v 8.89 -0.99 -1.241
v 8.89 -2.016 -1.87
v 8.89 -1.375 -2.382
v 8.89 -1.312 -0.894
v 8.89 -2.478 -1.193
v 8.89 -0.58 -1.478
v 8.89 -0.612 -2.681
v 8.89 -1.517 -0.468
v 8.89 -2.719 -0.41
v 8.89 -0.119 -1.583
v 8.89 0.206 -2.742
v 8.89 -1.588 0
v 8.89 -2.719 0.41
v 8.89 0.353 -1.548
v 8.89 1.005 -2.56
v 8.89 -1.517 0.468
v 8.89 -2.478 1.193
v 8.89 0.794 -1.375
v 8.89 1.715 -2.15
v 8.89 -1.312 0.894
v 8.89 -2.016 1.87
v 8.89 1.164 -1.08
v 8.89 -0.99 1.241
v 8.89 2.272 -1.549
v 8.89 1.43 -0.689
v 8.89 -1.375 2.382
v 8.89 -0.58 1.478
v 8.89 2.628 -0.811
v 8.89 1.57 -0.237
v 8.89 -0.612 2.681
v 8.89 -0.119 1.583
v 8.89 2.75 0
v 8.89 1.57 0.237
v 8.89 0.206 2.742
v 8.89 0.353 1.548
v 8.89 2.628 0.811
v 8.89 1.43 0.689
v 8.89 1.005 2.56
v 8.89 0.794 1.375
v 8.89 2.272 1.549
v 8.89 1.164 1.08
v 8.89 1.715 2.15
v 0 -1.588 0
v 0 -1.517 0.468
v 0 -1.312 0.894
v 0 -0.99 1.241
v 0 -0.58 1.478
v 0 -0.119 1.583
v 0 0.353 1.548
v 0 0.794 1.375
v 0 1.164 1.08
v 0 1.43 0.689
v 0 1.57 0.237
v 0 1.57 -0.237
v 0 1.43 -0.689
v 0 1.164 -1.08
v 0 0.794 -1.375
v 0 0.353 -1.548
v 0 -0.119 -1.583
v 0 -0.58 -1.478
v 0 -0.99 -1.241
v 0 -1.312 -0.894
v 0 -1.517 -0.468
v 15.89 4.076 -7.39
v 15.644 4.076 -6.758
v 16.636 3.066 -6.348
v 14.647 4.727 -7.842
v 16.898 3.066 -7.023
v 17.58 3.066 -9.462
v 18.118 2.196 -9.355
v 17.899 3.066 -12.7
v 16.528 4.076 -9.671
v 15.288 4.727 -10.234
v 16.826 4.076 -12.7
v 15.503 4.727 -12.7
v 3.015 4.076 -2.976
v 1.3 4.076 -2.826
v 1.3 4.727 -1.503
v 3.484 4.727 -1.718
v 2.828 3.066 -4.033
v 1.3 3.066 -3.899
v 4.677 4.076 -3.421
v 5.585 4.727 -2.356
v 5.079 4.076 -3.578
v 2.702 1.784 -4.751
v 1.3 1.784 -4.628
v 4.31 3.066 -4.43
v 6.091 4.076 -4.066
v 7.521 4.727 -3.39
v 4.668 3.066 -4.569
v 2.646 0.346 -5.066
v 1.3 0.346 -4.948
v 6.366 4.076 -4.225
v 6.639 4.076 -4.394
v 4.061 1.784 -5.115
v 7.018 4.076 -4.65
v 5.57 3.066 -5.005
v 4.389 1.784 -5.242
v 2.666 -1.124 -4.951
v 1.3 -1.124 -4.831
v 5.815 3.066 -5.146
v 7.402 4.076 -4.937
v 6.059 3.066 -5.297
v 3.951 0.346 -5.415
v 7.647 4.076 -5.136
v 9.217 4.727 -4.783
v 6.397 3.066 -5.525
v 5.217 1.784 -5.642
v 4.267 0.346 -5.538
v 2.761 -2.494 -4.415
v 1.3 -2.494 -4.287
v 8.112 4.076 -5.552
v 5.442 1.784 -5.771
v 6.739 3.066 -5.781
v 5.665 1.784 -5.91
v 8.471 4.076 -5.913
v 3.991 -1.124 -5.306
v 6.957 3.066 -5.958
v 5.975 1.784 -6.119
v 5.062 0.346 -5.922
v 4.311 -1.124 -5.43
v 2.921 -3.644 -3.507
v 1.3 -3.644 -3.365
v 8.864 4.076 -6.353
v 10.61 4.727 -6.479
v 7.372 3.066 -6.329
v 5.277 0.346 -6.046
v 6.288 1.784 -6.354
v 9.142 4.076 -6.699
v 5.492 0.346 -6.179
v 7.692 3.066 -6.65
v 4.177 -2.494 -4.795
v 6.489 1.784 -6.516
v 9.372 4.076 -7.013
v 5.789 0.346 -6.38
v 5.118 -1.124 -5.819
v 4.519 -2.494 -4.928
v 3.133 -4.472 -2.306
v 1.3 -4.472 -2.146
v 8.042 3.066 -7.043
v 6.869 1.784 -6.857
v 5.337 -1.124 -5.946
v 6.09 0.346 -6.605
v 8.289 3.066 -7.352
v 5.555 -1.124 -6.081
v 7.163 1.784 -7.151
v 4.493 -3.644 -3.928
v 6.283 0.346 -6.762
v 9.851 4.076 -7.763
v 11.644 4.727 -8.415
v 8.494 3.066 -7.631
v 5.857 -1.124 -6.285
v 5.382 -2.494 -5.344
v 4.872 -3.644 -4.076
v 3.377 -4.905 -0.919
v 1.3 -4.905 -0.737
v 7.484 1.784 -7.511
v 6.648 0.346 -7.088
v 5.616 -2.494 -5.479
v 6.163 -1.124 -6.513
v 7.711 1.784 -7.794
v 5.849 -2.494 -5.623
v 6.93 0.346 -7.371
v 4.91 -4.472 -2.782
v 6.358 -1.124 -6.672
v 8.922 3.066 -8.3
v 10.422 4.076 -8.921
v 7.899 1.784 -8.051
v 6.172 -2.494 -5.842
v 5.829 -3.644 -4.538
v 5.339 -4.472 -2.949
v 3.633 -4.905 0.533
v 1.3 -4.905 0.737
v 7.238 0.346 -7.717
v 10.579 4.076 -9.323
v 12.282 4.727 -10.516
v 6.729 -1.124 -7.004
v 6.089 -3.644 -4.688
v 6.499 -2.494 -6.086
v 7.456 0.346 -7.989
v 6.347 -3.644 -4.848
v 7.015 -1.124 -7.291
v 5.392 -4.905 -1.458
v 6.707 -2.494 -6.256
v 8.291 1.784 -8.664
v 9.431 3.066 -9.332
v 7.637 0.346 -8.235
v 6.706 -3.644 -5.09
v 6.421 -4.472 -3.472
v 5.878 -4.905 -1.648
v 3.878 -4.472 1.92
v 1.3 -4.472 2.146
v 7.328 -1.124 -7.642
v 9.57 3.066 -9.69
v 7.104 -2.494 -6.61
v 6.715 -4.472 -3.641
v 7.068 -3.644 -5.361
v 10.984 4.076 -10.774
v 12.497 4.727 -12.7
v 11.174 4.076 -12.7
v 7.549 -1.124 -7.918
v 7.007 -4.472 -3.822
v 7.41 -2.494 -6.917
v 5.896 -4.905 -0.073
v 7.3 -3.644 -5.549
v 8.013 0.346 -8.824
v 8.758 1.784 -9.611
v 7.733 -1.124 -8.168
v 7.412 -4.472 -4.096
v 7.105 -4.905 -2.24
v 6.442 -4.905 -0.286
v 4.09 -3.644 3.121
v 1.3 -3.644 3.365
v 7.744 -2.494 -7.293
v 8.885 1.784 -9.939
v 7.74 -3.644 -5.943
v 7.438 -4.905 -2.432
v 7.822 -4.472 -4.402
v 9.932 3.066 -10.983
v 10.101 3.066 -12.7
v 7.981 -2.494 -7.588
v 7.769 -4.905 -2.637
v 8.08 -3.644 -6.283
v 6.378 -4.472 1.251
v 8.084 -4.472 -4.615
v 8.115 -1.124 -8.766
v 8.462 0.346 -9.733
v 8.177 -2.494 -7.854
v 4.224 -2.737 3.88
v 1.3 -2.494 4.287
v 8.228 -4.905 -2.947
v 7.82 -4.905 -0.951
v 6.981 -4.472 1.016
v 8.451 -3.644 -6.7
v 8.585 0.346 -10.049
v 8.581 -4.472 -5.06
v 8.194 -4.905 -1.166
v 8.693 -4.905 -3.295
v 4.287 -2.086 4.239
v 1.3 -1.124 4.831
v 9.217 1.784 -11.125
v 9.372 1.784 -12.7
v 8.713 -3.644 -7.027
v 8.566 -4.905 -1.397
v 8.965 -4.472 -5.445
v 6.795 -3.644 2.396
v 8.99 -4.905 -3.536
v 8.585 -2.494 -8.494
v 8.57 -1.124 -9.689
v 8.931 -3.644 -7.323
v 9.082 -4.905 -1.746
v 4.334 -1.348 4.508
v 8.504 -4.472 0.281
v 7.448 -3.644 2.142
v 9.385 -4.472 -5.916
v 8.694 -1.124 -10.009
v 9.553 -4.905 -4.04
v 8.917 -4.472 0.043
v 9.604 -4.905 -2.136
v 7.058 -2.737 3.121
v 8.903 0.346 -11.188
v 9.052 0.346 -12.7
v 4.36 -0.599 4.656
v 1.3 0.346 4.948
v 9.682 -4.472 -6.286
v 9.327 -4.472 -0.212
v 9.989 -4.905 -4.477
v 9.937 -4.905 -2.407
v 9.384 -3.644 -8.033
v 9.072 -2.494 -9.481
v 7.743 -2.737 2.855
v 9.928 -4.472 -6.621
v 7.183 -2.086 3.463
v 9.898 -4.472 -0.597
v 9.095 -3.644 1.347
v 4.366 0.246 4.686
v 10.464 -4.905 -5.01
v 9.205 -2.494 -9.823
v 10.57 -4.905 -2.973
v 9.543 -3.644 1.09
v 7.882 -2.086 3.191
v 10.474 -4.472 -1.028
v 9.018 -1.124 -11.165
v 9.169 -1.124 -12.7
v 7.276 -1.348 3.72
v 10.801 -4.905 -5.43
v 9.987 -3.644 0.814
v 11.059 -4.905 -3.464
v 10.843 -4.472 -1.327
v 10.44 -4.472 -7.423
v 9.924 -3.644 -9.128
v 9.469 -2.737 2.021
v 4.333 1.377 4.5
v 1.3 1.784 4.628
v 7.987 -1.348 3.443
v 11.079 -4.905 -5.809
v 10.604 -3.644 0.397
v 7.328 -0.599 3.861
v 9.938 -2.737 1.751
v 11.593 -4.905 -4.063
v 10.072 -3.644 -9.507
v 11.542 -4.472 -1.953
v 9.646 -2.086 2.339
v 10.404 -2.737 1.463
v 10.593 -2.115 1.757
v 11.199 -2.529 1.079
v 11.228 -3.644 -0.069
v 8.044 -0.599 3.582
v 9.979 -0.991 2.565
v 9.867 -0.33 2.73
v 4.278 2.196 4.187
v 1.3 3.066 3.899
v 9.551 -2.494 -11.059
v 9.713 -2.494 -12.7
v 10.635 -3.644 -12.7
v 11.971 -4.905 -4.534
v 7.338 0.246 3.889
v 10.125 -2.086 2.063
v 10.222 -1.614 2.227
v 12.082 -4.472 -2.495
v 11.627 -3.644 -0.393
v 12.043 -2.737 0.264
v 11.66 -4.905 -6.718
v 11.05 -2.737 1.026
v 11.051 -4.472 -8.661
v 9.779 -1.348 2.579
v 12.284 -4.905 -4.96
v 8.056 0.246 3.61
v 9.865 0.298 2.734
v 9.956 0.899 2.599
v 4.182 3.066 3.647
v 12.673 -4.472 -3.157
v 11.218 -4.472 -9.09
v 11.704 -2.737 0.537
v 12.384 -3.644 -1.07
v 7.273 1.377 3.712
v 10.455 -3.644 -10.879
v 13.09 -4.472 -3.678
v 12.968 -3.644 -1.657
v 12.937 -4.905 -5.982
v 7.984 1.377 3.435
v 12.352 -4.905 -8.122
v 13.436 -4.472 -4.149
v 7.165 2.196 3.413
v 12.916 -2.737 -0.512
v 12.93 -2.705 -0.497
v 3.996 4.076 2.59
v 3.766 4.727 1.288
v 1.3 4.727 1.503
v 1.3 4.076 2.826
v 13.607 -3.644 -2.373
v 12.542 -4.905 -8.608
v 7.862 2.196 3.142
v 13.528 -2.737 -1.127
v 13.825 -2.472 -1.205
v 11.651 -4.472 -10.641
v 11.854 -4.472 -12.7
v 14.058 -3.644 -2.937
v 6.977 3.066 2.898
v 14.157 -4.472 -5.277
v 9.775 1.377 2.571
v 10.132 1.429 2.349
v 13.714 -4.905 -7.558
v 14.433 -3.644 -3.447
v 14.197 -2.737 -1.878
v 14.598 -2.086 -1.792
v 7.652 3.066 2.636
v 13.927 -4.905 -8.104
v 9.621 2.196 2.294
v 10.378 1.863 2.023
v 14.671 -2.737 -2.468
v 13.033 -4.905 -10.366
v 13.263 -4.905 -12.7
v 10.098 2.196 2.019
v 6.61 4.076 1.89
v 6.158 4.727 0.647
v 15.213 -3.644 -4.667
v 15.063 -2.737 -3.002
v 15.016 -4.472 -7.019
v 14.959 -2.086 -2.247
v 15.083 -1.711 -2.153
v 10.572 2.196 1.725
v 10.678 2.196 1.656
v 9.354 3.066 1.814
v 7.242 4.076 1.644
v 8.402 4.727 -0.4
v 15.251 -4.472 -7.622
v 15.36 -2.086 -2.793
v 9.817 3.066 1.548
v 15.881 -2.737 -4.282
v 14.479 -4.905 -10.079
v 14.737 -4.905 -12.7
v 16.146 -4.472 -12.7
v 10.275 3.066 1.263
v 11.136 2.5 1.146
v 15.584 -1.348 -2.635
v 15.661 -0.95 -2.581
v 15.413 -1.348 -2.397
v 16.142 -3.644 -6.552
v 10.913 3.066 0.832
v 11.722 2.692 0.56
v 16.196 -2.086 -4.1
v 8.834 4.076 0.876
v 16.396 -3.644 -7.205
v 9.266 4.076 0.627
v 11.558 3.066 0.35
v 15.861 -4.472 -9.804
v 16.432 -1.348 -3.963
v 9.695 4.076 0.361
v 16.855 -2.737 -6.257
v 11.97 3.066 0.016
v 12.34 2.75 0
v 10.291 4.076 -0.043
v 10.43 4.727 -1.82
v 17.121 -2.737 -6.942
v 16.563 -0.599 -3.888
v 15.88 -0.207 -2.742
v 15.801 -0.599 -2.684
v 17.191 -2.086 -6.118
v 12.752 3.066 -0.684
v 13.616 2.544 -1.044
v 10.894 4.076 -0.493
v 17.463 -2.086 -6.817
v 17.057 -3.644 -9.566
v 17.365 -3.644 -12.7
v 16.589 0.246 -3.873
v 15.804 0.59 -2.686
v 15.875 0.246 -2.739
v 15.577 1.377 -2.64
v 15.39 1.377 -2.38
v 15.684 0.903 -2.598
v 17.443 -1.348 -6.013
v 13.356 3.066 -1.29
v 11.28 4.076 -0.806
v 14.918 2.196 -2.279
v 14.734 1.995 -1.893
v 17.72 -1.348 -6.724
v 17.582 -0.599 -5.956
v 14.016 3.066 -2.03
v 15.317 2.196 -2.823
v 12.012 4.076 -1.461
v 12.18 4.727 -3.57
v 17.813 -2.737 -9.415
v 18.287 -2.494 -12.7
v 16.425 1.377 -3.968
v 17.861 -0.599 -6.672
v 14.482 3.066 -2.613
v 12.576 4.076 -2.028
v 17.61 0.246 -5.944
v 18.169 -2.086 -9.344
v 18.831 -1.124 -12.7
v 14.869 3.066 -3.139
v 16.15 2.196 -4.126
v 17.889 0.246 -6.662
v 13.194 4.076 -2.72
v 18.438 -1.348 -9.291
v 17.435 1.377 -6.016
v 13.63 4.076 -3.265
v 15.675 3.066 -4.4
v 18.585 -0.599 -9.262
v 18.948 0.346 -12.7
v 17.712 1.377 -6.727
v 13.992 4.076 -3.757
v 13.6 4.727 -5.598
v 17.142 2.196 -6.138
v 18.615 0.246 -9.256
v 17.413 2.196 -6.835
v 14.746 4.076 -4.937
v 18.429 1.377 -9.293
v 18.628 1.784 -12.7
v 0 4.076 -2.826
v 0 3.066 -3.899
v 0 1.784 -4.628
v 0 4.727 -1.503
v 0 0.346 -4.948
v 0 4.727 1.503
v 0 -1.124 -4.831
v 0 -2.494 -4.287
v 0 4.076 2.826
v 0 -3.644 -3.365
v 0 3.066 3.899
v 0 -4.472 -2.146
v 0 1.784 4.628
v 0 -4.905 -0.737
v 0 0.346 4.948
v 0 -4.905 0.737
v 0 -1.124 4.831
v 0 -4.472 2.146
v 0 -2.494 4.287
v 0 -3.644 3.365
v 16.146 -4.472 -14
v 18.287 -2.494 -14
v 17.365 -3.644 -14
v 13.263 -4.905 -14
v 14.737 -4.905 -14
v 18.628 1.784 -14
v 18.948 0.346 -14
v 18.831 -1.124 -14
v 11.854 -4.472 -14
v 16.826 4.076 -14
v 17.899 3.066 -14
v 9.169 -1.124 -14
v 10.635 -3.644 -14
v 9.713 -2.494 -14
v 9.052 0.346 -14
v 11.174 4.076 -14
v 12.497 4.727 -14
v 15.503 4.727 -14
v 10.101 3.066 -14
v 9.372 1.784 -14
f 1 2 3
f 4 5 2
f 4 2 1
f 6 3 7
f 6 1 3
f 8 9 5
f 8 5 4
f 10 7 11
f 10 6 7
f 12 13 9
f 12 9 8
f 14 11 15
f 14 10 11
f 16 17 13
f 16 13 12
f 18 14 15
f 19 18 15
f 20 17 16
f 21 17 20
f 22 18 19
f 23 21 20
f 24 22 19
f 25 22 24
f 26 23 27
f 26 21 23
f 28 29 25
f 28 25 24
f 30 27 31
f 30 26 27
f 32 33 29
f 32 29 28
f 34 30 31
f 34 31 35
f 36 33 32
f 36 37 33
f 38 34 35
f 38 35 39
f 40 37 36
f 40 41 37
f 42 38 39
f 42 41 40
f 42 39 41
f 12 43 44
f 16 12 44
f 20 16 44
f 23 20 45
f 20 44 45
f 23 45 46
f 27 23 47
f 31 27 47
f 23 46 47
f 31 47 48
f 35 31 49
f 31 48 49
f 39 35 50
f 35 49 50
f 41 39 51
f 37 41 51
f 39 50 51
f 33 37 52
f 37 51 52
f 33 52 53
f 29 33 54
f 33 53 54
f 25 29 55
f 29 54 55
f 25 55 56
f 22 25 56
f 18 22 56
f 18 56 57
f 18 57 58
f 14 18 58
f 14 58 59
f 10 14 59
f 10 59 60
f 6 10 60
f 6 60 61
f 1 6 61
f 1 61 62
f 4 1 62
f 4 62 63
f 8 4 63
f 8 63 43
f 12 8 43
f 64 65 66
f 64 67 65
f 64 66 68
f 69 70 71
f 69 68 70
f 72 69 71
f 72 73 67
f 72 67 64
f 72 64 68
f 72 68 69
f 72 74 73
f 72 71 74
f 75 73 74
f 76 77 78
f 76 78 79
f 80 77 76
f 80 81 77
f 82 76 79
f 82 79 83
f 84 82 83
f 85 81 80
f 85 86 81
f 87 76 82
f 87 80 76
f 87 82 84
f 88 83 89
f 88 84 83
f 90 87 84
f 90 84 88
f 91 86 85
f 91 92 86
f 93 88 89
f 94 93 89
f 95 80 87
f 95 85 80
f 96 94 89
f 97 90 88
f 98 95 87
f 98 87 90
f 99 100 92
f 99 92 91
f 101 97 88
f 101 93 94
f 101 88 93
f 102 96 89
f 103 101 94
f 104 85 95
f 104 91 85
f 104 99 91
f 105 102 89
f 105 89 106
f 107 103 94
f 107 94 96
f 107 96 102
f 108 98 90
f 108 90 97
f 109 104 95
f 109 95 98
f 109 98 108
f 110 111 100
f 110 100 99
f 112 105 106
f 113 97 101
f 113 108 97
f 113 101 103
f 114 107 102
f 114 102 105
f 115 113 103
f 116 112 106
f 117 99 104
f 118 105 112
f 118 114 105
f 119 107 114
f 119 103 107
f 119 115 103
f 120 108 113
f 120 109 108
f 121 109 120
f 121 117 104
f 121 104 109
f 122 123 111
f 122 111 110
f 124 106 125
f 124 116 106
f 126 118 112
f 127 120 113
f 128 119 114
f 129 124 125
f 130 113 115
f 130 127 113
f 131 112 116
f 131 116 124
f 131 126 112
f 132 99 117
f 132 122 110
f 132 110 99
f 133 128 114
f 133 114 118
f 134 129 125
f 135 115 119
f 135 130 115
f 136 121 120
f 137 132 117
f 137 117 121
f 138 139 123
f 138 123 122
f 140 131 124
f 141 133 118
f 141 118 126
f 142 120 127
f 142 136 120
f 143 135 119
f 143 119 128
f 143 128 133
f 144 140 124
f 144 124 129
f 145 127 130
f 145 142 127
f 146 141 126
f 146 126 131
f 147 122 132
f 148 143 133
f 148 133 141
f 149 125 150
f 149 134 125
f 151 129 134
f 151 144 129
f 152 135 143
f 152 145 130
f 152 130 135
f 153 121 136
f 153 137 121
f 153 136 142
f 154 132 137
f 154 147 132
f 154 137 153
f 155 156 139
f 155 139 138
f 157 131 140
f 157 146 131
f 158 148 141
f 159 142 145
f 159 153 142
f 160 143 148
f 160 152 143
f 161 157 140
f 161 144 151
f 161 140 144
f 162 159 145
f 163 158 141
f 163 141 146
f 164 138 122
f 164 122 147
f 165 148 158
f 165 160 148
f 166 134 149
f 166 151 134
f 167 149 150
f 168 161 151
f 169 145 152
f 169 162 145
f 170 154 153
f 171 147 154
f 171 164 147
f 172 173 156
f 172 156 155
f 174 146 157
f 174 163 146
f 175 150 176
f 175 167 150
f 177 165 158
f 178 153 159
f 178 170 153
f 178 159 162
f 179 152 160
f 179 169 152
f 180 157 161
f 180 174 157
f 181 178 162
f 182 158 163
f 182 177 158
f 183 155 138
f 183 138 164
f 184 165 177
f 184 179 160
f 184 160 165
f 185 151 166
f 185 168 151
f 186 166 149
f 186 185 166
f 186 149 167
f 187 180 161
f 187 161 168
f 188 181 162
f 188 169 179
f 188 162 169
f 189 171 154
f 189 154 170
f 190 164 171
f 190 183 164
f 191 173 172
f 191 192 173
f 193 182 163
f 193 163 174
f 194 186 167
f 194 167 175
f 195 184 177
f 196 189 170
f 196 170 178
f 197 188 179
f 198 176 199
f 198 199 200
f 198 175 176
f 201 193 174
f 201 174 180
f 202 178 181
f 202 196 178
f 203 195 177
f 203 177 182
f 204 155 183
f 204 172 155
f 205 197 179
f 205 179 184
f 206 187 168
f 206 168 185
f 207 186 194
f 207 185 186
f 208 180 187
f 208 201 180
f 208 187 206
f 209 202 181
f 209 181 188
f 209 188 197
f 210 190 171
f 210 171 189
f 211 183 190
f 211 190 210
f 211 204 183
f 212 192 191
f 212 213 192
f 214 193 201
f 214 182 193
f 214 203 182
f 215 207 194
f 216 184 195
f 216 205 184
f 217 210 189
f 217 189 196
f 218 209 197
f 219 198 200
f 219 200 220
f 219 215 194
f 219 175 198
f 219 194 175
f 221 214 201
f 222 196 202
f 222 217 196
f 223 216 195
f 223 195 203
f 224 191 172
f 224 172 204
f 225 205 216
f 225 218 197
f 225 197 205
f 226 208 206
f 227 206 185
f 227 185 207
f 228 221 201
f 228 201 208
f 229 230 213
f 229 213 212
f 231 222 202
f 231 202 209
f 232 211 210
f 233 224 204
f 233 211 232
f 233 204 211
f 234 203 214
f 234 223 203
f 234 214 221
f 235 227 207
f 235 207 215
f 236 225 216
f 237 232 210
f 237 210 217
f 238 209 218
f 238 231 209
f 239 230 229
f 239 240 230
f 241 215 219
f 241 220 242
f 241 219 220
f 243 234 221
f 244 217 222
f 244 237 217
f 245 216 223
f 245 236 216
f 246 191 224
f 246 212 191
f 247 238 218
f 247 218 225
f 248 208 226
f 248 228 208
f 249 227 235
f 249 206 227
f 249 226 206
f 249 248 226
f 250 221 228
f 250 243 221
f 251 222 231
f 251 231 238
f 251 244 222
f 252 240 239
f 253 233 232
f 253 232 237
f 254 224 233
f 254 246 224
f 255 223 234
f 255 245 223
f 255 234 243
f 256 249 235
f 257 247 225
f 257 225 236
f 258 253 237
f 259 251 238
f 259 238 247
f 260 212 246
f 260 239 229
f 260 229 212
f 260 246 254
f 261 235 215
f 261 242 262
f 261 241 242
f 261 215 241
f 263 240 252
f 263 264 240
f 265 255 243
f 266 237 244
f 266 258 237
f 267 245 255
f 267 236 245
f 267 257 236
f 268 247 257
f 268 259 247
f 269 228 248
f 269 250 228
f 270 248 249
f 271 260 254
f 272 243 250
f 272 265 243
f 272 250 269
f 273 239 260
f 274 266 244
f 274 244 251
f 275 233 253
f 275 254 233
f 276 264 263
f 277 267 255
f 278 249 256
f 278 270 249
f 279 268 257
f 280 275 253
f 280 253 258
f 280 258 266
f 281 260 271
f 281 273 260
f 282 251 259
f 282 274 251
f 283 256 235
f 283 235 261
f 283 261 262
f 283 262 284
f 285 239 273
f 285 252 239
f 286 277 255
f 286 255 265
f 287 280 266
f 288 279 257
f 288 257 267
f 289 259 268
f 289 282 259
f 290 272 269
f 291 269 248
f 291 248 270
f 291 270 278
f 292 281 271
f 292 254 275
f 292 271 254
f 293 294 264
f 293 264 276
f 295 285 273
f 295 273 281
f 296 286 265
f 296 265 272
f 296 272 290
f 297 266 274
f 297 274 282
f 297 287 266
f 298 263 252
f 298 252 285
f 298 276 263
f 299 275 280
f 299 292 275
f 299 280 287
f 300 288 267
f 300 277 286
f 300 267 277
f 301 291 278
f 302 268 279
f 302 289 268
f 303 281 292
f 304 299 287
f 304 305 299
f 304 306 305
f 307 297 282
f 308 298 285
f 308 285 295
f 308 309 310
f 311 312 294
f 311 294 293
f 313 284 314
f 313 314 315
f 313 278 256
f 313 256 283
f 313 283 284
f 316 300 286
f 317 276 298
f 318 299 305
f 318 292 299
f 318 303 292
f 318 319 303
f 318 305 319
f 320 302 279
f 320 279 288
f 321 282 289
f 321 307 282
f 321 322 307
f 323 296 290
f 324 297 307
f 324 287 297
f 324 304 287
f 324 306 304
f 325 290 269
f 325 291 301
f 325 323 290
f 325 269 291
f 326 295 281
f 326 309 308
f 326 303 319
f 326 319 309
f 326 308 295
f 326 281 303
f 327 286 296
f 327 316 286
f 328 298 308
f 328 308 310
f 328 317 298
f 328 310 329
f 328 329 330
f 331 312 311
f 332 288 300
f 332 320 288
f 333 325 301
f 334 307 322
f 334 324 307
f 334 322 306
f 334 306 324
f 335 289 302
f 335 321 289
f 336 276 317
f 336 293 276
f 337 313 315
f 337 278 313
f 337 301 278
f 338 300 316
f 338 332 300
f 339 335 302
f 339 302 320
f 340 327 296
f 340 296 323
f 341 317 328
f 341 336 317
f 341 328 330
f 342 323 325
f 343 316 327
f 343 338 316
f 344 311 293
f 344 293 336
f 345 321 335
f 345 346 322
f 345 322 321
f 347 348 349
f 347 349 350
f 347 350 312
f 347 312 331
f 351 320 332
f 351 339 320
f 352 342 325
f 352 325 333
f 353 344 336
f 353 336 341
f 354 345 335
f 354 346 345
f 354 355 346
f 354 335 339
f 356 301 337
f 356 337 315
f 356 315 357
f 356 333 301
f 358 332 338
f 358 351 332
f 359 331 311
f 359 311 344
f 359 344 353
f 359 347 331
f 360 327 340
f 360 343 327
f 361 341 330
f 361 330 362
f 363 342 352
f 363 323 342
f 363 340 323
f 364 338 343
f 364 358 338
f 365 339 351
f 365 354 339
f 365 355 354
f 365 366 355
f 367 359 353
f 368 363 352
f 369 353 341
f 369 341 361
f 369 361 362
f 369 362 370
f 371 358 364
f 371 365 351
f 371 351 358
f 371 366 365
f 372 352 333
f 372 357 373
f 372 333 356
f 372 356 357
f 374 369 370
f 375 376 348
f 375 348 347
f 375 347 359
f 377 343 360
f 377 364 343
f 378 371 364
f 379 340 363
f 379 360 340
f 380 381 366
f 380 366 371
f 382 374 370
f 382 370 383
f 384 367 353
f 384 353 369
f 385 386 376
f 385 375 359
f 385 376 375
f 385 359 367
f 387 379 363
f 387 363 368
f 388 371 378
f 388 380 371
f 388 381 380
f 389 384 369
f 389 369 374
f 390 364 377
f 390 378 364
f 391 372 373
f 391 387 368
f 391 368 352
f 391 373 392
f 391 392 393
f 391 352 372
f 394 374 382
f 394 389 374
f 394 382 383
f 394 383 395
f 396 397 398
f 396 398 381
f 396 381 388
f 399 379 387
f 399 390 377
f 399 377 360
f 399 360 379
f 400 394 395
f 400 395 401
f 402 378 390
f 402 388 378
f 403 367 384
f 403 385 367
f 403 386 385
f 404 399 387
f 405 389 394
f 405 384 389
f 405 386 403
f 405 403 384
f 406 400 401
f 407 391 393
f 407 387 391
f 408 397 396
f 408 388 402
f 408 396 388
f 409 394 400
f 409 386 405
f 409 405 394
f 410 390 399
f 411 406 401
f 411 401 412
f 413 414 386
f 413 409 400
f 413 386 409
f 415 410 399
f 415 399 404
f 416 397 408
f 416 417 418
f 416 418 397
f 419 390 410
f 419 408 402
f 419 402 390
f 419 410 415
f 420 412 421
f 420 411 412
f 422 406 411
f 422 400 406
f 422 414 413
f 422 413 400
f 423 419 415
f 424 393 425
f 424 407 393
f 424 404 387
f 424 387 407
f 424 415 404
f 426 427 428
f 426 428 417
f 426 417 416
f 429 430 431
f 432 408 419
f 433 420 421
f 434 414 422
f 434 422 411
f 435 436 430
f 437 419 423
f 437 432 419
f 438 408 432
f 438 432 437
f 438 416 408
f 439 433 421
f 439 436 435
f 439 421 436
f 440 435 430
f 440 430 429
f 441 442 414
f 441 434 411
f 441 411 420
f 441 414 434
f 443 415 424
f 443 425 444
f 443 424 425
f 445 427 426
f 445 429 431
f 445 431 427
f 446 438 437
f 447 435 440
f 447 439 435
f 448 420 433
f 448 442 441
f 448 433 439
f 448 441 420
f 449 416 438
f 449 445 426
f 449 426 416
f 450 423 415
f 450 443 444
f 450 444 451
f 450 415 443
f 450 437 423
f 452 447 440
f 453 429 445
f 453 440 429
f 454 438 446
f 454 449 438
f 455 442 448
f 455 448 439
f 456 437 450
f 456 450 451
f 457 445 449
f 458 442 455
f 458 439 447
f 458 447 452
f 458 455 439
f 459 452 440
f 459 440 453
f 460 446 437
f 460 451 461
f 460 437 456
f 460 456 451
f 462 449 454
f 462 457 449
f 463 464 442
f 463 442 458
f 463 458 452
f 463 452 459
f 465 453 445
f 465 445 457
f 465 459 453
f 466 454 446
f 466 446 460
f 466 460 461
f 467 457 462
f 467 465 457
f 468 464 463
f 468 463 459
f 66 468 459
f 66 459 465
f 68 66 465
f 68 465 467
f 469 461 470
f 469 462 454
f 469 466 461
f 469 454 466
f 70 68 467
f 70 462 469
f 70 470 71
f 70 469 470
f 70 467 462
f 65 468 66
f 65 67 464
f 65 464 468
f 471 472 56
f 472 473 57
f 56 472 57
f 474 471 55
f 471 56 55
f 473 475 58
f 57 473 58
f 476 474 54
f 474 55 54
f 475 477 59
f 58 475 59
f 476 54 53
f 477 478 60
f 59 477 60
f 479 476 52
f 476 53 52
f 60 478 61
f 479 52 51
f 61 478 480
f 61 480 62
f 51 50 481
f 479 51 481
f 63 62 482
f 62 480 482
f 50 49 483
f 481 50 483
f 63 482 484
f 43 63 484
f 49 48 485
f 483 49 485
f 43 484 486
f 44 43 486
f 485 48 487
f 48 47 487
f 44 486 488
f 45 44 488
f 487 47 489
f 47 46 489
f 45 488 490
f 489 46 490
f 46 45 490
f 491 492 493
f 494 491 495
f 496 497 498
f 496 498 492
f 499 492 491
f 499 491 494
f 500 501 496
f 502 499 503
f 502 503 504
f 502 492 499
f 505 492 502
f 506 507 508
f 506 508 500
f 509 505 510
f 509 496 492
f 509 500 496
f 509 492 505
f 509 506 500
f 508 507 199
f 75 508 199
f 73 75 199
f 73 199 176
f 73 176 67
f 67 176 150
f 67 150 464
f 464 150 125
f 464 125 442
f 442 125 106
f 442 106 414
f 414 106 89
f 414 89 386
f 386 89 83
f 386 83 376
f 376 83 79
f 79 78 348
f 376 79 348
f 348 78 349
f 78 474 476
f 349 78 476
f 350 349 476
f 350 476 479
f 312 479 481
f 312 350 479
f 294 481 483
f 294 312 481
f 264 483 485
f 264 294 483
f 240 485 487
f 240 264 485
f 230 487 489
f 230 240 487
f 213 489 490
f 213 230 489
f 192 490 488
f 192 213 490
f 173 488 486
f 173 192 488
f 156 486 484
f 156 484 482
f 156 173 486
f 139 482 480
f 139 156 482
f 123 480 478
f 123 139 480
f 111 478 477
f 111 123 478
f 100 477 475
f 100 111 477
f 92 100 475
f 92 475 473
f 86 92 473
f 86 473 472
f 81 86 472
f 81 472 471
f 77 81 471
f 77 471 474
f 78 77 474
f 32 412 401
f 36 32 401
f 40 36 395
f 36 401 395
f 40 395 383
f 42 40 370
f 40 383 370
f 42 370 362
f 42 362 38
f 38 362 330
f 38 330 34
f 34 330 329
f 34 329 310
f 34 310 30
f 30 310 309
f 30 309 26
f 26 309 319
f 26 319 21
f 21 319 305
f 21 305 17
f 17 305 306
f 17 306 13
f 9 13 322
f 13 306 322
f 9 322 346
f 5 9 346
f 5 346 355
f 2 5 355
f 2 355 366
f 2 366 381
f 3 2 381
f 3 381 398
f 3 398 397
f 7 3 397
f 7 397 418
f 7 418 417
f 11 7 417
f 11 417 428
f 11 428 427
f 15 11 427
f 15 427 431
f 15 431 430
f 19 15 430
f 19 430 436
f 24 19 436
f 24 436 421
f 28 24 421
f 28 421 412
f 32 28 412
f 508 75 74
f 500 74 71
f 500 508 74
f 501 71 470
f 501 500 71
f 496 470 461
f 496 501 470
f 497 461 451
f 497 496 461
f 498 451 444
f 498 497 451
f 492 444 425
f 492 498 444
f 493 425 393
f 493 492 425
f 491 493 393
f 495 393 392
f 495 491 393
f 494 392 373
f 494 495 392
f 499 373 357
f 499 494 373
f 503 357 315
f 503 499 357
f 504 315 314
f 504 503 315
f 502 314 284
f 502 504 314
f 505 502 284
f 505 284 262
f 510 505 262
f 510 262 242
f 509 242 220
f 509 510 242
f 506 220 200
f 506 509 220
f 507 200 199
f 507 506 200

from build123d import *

# Parameters (mm, degrees)
F1_R      = 4.96
F3_R      = 1.5875
F4_DEPTH  = 18.961
F6_R      = 2.75
F7_DEPTH  = 10.16
F9_W      = 0.254
F9_H      = 19.05
F10_DEPTH = 18.961


with BuildPart() as f2:
    # F2: sweep along a path in F0
    with BuildLine(Plane.XZ) as f2_path:
        Line((0, 0), (1.3, 0))
        ThreePointArc((1.3, 0), (10.280256, -3.719744), (14, -12.7))
        Line((14, -12.7), (14, -14))
    # F1 (on Right) → F2 (sweep)
    with BuildSketch(Plane.YZ):
        Circle(F1_R)
    sweep(path=f2_path.line)

    # F3 (on face) → F4 (cut, through all)
    with BuildSketch(Plane(origin=(0, 0, 0), x_dir=(0, -1, 0), z_dir=(-1, 0, 0))):
        Circle(F3_R)
    extrude(amount=-F4_DEPTH, mode=Mode.SUBTRACT)

    # F6 (on offset) → F7 (cut)
    with BuildSketch(Plane.YZ.offset(19.05)):
        Circle(F6_R)
    extrude(amount=-F7_DEPTH, mode=Mode.SUBTRACT)

    # F9 (on Right) → F10 (cut, through all)
    with BuildSketch(Plane.YZ):
        with Locations((4.853686, -4.475)):
            Rectangle(F9_W, F9_H)
    extrude(amount=F10_DEPTH, mode=Mode.SUBTRACT)


solid = f2.part
